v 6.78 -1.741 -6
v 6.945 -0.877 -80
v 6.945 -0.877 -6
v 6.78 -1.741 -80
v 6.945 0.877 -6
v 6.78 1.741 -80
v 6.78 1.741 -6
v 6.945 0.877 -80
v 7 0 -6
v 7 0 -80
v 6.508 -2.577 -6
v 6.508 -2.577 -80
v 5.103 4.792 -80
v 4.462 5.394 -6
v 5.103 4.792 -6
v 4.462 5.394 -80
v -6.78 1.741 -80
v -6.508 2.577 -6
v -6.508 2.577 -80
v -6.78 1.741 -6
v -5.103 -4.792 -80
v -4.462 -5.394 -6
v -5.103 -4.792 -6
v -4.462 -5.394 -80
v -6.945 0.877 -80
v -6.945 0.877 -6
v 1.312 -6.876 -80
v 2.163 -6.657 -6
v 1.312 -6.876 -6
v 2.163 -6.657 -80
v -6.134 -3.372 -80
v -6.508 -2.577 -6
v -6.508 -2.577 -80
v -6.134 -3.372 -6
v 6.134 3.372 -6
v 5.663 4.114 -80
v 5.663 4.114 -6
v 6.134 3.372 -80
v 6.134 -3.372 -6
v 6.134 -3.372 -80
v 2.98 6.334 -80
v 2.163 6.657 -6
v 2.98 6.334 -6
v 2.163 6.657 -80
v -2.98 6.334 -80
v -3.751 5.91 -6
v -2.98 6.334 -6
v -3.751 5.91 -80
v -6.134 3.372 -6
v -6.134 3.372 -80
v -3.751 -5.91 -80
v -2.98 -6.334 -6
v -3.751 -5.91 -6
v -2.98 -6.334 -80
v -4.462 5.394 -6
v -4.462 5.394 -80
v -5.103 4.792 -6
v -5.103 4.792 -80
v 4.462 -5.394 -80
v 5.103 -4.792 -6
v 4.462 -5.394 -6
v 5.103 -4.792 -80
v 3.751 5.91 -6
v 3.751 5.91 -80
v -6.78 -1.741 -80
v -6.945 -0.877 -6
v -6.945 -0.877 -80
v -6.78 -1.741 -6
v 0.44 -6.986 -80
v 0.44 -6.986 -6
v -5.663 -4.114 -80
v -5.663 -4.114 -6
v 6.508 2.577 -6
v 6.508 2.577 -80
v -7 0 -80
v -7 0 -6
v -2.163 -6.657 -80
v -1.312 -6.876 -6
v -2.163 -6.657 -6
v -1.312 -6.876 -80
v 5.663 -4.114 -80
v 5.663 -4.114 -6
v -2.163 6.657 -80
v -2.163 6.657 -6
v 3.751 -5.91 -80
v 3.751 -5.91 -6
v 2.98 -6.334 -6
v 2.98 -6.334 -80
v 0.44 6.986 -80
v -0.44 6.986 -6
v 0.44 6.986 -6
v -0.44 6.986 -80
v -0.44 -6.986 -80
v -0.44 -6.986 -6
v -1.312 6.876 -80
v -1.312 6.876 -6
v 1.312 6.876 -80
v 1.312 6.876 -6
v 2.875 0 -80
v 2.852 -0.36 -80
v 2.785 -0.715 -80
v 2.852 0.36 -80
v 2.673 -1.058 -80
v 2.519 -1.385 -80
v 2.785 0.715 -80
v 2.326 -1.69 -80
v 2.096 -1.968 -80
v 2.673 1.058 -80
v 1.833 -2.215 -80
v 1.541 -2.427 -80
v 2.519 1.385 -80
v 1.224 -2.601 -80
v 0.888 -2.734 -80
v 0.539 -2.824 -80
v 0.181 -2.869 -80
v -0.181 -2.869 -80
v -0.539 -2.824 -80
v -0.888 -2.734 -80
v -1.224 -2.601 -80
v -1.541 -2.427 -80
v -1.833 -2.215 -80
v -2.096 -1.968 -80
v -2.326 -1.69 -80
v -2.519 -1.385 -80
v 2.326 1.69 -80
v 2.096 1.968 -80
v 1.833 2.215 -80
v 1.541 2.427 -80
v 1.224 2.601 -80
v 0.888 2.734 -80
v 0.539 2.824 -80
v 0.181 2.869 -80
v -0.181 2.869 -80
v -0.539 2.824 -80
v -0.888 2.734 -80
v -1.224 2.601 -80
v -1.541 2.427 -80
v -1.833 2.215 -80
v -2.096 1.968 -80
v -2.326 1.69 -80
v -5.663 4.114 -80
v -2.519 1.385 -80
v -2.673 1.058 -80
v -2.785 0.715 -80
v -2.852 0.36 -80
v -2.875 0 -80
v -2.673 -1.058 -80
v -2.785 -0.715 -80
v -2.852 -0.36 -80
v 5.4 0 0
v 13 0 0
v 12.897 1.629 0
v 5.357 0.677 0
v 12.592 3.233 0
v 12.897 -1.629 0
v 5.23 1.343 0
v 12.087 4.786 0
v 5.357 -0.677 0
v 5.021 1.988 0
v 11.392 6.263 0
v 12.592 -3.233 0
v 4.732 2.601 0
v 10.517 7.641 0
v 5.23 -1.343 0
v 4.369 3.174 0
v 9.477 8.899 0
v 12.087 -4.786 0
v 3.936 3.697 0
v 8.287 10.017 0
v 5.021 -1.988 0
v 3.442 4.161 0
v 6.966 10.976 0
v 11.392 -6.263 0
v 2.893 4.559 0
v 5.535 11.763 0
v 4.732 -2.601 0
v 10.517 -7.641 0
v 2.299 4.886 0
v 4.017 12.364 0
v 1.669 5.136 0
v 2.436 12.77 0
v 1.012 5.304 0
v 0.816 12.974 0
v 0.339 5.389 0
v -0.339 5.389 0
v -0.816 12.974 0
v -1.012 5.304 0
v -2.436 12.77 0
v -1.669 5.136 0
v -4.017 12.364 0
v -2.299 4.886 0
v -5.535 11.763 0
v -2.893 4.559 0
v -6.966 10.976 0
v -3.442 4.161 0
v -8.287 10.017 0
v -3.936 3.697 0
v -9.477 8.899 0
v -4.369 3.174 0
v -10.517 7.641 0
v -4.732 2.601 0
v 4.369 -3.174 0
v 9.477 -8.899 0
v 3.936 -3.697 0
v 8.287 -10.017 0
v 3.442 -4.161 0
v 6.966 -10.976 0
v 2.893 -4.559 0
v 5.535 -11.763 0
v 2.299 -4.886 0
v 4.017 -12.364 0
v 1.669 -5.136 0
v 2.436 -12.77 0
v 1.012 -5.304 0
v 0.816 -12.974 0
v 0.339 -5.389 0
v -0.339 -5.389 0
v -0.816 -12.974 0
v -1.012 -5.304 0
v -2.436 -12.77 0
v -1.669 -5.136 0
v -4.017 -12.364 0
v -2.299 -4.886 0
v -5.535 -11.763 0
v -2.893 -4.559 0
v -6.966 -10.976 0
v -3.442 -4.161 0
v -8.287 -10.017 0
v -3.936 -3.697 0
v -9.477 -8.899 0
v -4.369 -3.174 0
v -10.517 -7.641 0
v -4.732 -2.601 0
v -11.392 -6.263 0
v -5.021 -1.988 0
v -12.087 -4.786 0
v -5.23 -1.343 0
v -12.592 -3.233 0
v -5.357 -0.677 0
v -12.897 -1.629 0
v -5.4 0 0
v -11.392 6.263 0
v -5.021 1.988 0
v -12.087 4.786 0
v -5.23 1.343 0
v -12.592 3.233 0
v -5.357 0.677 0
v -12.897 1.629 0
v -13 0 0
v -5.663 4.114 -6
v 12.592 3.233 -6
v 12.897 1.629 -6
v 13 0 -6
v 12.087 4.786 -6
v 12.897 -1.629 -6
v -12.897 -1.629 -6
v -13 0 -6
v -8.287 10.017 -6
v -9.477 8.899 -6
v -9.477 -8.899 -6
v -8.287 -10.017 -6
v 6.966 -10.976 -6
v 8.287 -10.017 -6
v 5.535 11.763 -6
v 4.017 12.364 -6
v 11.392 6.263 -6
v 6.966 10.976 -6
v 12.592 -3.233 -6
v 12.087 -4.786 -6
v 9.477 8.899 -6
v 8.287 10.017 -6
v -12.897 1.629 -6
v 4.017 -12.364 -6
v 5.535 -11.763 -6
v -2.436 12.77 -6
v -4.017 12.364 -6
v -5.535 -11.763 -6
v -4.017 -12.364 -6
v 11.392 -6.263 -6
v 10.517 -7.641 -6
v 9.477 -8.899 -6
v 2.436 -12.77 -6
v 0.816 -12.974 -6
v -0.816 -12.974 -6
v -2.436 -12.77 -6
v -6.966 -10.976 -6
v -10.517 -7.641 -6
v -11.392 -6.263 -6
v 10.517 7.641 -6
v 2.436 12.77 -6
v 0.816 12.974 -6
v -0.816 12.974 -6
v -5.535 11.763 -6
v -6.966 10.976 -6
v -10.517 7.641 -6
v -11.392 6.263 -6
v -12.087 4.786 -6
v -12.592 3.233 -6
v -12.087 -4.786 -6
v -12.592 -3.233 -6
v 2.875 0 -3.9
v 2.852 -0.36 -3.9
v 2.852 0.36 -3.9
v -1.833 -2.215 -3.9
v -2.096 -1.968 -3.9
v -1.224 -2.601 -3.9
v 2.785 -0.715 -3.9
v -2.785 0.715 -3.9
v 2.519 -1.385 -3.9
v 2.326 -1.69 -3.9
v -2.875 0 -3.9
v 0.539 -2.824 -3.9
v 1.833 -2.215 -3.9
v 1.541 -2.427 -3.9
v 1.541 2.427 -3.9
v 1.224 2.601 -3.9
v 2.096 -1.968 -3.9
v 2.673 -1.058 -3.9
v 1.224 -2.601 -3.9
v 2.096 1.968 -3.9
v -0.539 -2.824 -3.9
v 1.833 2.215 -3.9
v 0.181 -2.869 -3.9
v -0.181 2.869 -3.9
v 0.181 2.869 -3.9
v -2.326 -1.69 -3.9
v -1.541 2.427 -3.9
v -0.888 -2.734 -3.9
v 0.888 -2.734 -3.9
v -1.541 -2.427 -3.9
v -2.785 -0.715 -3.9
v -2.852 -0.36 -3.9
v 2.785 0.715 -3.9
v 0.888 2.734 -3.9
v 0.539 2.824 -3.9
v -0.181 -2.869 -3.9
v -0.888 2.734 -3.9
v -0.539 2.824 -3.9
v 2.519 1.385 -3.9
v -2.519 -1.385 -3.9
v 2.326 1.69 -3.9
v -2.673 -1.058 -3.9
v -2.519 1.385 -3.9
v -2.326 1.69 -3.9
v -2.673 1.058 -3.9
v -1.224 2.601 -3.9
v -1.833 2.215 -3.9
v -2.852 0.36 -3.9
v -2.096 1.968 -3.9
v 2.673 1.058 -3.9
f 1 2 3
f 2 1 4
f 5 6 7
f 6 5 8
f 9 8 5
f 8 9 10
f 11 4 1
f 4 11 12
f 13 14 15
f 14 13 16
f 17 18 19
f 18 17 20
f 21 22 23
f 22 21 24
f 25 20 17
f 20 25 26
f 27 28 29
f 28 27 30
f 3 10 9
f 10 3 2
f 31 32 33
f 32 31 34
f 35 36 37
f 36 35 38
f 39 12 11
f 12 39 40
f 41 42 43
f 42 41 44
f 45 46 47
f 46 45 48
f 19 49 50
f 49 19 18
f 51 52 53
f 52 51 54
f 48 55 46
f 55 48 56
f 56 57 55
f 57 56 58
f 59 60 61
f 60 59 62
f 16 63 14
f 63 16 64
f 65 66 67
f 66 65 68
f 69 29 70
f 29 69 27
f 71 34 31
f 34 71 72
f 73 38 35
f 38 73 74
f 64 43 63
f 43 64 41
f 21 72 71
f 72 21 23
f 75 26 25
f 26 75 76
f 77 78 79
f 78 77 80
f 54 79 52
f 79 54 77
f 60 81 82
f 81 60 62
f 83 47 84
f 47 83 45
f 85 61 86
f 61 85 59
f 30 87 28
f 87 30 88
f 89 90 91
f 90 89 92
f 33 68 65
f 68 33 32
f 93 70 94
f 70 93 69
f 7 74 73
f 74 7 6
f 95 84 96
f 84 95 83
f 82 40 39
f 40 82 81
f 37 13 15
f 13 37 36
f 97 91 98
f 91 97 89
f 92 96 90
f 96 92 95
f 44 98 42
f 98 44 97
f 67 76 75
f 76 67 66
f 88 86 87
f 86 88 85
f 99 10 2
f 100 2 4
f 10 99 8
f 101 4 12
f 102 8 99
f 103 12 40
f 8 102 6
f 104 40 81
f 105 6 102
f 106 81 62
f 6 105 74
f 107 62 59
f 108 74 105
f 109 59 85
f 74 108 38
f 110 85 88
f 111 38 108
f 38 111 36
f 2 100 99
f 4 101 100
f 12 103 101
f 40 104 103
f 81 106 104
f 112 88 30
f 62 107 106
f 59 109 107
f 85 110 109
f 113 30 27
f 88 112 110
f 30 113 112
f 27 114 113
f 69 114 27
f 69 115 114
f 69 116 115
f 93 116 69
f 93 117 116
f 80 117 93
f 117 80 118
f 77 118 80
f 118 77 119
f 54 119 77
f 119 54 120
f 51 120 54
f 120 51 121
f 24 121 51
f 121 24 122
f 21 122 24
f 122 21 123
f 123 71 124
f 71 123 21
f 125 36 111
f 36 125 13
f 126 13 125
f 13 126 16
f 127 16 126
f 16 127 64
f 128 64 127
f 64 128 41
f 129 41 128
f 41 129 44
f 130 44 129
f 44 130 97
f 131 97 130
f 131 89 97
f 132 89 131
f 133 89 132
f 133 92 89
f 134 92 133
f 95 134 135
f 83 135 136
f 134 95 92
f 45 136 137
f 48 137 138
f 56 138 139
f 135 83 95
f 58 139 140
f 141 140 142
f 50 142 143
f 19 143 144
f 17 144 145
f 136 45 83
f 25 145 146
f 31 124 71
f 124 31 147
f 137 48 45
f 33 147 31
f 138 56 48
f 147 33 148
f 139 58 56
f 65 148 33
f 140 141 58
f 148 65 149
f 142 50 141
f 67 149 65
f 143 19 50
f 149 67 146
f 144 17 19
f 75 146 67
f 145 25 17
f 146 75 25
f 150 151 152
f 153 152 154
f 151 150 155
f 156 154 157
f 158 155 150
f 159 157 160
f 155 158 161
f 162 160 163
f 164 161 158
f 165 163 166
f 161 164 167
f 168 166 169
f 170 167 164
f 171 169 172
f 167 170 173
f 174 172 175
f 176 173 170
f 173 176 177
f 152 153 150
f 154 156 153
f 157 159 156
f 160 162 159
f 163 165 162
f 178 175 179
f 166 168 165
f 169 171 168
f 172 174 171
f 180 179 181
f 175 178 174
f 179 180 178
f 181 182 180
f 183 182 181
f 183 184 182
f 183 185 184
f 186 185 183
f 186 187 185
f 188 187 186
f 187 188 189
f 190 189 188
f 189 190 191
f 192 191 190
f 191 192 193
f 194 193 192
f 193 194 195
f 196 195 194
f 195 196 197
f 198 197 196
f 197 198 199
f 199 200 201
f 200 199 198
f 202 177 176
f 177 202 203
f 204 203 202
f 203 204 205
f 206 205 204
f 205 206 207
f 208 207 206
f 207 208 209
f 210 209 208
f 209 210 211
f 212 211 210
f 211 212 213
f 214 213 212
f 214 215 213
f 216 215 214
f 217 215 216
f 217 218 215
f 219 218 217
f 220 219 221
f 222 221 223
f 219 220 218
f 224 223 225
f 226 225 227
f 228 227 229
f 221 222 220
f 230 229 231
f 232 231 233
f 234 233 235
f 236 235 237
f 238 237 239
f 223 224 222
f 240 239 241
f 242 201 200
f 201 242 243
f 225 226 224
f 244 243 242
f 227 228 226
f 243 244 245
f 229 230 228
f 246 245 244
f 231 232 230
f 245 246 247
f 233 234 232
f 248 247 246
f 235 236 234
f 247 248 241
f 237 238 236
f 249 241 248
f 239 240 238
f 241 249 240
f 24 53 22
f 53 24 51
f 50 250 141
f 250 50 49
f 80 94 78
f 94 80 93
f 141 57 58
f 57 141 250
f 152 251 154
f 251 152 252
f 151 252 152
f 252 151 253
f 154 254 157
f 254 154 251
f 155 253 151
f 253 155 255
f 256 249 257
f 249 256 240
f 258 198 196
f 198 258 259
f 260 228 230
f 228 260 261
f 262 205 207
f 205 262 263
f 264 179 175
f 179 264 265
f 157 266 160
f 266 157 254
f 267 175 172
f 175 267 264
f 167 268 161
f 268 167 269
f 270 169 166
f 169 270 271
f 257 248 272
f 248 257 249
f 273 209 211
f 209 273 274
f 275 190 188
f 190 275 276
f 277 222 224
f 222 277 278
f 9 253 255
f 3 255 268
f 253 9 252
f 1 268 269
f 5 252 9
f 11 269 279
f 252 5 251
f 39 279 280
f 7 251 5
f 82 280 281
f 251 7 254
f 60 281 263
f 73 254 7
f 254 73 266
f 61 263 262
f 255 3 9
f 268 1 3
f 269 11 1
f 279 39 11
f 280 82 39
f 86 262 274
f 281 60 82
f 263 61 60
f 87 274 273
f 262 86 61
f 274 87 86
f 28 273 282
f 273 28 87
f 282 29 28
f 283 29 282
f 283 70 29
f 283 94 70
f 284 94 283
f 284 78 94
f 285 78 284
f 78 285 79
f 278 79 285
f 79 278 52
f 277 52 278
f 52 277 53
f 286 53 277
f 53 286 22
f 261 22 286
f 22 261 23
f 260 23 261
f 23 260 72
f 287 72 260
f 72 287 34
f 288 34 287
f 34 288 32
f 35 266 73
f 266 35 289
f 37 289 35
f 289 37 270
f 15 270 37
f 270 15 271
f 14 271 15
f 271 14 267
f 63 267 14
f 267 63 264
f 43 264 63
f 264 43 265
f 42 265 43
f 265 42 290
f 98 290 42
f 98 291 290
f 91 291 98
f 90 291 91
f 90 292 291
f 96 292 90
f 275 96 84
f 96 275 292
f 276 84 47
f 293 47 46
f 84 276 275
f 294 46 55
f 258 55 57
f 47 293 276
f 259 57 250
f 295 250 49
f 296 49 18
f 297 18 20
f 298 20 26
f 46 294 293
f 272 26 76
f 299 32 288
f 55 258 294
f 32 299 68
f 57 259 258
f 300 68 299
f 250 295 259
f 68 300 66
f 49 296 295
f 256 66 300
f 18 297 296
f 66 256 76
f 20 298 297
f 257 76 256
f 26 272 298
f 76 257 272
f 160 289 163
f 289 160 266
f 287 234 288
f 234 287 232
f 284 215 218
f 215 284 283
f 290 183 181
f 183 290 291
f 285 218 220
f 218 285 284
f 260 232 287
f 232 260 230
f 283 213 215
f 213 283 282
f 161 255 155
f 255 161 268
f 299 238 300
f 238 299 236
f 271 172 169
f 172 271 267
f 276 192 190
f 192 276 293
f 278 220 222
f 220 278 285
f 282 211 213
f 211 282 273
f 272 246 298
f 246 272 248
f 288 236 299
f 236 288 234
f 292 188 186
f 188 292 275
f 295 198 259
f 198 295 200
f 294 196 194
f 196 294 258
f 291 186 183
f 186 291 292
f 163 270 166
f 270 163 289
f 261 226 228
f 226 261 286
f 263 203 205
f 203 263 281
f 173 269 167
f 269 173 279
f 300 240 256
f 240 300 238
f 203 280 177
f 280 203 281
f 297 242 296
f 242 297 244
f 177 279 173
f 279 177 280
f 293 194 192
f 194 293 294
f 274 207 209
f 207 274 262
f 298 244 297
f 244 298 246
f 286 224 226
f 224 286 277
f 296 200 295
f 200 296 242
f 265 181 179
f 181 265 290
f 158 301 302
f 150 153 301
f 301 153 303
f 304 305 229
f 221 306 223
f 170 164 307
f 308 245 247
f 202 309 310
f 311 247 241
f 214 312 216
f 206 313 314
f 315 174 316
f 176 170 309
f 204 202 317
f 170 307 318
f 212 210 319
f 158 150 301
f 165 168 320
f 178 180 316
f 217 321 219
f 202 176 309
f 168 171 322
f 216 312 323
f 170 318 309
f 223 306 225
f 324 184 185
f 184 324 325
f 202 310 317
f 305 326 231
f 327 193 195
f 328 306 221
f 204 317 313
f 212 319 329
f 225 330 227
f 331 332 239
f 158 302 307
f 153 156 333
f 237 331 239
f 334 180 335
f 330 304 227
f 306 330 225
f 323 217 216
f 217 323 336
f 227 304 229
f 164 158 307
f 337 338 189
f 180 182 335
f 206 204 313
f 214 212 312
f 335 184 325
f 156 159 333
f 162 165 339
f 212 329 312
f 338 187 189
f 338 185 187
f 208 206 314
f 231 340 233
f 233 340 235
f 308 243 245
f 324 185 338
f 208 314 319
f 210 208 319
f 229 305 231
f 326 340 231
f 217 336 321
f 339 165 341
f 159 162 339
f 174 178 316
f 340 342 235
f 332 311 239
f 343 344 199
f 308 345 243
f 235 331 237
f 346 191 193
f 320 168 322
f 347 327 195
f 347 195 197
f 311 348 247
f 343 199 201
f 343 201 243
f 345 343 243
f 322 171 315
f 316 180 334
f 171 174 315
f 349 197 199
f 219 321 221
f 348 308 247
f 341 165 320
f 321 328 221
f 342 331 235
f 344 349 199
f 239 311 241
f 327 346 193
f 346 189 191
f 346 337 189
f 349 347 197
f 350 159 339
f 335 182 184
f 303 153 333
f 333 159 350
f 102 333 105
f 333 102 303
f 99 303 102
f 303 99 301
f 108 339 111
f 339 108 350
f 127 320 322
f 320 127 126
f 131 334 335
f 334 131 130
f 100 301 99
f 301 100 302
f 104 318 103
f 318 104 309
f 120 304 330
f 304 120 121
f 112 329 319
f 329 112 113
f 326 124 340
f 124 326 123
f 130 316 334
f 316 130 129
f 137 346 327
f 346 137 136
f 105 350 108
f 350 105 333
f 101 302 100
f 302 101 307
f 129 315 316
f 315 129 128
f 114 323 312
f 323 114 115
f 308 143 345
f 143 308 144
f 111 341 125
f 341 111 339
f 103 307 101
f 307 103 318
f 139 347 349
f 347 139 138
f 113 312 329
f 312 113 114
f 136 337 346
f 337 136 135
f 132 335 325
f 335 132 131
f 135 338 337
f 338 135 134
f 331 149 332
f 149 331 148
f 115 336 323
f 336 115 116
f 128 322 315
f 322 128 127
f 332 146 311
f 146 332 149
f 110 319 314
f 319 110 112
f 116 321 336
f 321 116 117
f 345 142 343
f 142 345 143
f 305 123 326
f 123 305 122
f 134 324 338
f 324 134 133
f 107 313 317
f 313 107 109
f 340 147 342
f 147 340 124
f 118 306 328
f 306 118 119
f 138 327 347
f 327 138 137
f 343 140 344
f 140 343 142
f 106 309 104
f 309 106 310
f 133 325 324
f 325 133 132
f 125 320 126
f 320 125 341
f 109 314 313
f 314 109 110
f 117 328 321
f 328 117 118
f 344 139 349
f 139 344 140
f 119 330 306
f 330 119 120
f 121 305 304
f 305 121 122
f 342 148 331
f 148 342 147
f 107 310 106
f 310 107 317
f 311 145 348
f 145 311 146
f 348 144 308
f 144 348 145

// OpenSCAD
$fn = 50;


difference() {
	union() {
		translate(v = [0, 0, -80.0000000000]) {
			cylinder(h = 80, r = 7.0000000000);
		}
		translate(v = [0, 0, -6.0000000000]) {
			cylinder(h = 6, r = 13.0000000000);
		}
	}
	union() {
		translate(v = [0, 0, 0]) {
			rotate(a = [0, 0, 0]) {
				difference() {
					union() {
						#translate(v = [0, 0, -80.0000000000]) {
							cylinder(h = 80, r = 2.6000000000);
						}
						#translate(v = [0, 0, -3.9000000000]) {
							cylinder(h = 3.9000000000, r = 7.0000000000, r1 = 2.8750000000, r2 = 5.4000000000);
						}
						#translate(v = [0, 0, -80.0000000000]) {
							cylinder(h = 80, r = 2.8750000000);
						}
						#translate(v = [0, 0, -80.0000000000]) {
							cylinder(h = 80, r = 2.6000000000);
						}
					}
					union();
				}
			}
		}
	}
}
